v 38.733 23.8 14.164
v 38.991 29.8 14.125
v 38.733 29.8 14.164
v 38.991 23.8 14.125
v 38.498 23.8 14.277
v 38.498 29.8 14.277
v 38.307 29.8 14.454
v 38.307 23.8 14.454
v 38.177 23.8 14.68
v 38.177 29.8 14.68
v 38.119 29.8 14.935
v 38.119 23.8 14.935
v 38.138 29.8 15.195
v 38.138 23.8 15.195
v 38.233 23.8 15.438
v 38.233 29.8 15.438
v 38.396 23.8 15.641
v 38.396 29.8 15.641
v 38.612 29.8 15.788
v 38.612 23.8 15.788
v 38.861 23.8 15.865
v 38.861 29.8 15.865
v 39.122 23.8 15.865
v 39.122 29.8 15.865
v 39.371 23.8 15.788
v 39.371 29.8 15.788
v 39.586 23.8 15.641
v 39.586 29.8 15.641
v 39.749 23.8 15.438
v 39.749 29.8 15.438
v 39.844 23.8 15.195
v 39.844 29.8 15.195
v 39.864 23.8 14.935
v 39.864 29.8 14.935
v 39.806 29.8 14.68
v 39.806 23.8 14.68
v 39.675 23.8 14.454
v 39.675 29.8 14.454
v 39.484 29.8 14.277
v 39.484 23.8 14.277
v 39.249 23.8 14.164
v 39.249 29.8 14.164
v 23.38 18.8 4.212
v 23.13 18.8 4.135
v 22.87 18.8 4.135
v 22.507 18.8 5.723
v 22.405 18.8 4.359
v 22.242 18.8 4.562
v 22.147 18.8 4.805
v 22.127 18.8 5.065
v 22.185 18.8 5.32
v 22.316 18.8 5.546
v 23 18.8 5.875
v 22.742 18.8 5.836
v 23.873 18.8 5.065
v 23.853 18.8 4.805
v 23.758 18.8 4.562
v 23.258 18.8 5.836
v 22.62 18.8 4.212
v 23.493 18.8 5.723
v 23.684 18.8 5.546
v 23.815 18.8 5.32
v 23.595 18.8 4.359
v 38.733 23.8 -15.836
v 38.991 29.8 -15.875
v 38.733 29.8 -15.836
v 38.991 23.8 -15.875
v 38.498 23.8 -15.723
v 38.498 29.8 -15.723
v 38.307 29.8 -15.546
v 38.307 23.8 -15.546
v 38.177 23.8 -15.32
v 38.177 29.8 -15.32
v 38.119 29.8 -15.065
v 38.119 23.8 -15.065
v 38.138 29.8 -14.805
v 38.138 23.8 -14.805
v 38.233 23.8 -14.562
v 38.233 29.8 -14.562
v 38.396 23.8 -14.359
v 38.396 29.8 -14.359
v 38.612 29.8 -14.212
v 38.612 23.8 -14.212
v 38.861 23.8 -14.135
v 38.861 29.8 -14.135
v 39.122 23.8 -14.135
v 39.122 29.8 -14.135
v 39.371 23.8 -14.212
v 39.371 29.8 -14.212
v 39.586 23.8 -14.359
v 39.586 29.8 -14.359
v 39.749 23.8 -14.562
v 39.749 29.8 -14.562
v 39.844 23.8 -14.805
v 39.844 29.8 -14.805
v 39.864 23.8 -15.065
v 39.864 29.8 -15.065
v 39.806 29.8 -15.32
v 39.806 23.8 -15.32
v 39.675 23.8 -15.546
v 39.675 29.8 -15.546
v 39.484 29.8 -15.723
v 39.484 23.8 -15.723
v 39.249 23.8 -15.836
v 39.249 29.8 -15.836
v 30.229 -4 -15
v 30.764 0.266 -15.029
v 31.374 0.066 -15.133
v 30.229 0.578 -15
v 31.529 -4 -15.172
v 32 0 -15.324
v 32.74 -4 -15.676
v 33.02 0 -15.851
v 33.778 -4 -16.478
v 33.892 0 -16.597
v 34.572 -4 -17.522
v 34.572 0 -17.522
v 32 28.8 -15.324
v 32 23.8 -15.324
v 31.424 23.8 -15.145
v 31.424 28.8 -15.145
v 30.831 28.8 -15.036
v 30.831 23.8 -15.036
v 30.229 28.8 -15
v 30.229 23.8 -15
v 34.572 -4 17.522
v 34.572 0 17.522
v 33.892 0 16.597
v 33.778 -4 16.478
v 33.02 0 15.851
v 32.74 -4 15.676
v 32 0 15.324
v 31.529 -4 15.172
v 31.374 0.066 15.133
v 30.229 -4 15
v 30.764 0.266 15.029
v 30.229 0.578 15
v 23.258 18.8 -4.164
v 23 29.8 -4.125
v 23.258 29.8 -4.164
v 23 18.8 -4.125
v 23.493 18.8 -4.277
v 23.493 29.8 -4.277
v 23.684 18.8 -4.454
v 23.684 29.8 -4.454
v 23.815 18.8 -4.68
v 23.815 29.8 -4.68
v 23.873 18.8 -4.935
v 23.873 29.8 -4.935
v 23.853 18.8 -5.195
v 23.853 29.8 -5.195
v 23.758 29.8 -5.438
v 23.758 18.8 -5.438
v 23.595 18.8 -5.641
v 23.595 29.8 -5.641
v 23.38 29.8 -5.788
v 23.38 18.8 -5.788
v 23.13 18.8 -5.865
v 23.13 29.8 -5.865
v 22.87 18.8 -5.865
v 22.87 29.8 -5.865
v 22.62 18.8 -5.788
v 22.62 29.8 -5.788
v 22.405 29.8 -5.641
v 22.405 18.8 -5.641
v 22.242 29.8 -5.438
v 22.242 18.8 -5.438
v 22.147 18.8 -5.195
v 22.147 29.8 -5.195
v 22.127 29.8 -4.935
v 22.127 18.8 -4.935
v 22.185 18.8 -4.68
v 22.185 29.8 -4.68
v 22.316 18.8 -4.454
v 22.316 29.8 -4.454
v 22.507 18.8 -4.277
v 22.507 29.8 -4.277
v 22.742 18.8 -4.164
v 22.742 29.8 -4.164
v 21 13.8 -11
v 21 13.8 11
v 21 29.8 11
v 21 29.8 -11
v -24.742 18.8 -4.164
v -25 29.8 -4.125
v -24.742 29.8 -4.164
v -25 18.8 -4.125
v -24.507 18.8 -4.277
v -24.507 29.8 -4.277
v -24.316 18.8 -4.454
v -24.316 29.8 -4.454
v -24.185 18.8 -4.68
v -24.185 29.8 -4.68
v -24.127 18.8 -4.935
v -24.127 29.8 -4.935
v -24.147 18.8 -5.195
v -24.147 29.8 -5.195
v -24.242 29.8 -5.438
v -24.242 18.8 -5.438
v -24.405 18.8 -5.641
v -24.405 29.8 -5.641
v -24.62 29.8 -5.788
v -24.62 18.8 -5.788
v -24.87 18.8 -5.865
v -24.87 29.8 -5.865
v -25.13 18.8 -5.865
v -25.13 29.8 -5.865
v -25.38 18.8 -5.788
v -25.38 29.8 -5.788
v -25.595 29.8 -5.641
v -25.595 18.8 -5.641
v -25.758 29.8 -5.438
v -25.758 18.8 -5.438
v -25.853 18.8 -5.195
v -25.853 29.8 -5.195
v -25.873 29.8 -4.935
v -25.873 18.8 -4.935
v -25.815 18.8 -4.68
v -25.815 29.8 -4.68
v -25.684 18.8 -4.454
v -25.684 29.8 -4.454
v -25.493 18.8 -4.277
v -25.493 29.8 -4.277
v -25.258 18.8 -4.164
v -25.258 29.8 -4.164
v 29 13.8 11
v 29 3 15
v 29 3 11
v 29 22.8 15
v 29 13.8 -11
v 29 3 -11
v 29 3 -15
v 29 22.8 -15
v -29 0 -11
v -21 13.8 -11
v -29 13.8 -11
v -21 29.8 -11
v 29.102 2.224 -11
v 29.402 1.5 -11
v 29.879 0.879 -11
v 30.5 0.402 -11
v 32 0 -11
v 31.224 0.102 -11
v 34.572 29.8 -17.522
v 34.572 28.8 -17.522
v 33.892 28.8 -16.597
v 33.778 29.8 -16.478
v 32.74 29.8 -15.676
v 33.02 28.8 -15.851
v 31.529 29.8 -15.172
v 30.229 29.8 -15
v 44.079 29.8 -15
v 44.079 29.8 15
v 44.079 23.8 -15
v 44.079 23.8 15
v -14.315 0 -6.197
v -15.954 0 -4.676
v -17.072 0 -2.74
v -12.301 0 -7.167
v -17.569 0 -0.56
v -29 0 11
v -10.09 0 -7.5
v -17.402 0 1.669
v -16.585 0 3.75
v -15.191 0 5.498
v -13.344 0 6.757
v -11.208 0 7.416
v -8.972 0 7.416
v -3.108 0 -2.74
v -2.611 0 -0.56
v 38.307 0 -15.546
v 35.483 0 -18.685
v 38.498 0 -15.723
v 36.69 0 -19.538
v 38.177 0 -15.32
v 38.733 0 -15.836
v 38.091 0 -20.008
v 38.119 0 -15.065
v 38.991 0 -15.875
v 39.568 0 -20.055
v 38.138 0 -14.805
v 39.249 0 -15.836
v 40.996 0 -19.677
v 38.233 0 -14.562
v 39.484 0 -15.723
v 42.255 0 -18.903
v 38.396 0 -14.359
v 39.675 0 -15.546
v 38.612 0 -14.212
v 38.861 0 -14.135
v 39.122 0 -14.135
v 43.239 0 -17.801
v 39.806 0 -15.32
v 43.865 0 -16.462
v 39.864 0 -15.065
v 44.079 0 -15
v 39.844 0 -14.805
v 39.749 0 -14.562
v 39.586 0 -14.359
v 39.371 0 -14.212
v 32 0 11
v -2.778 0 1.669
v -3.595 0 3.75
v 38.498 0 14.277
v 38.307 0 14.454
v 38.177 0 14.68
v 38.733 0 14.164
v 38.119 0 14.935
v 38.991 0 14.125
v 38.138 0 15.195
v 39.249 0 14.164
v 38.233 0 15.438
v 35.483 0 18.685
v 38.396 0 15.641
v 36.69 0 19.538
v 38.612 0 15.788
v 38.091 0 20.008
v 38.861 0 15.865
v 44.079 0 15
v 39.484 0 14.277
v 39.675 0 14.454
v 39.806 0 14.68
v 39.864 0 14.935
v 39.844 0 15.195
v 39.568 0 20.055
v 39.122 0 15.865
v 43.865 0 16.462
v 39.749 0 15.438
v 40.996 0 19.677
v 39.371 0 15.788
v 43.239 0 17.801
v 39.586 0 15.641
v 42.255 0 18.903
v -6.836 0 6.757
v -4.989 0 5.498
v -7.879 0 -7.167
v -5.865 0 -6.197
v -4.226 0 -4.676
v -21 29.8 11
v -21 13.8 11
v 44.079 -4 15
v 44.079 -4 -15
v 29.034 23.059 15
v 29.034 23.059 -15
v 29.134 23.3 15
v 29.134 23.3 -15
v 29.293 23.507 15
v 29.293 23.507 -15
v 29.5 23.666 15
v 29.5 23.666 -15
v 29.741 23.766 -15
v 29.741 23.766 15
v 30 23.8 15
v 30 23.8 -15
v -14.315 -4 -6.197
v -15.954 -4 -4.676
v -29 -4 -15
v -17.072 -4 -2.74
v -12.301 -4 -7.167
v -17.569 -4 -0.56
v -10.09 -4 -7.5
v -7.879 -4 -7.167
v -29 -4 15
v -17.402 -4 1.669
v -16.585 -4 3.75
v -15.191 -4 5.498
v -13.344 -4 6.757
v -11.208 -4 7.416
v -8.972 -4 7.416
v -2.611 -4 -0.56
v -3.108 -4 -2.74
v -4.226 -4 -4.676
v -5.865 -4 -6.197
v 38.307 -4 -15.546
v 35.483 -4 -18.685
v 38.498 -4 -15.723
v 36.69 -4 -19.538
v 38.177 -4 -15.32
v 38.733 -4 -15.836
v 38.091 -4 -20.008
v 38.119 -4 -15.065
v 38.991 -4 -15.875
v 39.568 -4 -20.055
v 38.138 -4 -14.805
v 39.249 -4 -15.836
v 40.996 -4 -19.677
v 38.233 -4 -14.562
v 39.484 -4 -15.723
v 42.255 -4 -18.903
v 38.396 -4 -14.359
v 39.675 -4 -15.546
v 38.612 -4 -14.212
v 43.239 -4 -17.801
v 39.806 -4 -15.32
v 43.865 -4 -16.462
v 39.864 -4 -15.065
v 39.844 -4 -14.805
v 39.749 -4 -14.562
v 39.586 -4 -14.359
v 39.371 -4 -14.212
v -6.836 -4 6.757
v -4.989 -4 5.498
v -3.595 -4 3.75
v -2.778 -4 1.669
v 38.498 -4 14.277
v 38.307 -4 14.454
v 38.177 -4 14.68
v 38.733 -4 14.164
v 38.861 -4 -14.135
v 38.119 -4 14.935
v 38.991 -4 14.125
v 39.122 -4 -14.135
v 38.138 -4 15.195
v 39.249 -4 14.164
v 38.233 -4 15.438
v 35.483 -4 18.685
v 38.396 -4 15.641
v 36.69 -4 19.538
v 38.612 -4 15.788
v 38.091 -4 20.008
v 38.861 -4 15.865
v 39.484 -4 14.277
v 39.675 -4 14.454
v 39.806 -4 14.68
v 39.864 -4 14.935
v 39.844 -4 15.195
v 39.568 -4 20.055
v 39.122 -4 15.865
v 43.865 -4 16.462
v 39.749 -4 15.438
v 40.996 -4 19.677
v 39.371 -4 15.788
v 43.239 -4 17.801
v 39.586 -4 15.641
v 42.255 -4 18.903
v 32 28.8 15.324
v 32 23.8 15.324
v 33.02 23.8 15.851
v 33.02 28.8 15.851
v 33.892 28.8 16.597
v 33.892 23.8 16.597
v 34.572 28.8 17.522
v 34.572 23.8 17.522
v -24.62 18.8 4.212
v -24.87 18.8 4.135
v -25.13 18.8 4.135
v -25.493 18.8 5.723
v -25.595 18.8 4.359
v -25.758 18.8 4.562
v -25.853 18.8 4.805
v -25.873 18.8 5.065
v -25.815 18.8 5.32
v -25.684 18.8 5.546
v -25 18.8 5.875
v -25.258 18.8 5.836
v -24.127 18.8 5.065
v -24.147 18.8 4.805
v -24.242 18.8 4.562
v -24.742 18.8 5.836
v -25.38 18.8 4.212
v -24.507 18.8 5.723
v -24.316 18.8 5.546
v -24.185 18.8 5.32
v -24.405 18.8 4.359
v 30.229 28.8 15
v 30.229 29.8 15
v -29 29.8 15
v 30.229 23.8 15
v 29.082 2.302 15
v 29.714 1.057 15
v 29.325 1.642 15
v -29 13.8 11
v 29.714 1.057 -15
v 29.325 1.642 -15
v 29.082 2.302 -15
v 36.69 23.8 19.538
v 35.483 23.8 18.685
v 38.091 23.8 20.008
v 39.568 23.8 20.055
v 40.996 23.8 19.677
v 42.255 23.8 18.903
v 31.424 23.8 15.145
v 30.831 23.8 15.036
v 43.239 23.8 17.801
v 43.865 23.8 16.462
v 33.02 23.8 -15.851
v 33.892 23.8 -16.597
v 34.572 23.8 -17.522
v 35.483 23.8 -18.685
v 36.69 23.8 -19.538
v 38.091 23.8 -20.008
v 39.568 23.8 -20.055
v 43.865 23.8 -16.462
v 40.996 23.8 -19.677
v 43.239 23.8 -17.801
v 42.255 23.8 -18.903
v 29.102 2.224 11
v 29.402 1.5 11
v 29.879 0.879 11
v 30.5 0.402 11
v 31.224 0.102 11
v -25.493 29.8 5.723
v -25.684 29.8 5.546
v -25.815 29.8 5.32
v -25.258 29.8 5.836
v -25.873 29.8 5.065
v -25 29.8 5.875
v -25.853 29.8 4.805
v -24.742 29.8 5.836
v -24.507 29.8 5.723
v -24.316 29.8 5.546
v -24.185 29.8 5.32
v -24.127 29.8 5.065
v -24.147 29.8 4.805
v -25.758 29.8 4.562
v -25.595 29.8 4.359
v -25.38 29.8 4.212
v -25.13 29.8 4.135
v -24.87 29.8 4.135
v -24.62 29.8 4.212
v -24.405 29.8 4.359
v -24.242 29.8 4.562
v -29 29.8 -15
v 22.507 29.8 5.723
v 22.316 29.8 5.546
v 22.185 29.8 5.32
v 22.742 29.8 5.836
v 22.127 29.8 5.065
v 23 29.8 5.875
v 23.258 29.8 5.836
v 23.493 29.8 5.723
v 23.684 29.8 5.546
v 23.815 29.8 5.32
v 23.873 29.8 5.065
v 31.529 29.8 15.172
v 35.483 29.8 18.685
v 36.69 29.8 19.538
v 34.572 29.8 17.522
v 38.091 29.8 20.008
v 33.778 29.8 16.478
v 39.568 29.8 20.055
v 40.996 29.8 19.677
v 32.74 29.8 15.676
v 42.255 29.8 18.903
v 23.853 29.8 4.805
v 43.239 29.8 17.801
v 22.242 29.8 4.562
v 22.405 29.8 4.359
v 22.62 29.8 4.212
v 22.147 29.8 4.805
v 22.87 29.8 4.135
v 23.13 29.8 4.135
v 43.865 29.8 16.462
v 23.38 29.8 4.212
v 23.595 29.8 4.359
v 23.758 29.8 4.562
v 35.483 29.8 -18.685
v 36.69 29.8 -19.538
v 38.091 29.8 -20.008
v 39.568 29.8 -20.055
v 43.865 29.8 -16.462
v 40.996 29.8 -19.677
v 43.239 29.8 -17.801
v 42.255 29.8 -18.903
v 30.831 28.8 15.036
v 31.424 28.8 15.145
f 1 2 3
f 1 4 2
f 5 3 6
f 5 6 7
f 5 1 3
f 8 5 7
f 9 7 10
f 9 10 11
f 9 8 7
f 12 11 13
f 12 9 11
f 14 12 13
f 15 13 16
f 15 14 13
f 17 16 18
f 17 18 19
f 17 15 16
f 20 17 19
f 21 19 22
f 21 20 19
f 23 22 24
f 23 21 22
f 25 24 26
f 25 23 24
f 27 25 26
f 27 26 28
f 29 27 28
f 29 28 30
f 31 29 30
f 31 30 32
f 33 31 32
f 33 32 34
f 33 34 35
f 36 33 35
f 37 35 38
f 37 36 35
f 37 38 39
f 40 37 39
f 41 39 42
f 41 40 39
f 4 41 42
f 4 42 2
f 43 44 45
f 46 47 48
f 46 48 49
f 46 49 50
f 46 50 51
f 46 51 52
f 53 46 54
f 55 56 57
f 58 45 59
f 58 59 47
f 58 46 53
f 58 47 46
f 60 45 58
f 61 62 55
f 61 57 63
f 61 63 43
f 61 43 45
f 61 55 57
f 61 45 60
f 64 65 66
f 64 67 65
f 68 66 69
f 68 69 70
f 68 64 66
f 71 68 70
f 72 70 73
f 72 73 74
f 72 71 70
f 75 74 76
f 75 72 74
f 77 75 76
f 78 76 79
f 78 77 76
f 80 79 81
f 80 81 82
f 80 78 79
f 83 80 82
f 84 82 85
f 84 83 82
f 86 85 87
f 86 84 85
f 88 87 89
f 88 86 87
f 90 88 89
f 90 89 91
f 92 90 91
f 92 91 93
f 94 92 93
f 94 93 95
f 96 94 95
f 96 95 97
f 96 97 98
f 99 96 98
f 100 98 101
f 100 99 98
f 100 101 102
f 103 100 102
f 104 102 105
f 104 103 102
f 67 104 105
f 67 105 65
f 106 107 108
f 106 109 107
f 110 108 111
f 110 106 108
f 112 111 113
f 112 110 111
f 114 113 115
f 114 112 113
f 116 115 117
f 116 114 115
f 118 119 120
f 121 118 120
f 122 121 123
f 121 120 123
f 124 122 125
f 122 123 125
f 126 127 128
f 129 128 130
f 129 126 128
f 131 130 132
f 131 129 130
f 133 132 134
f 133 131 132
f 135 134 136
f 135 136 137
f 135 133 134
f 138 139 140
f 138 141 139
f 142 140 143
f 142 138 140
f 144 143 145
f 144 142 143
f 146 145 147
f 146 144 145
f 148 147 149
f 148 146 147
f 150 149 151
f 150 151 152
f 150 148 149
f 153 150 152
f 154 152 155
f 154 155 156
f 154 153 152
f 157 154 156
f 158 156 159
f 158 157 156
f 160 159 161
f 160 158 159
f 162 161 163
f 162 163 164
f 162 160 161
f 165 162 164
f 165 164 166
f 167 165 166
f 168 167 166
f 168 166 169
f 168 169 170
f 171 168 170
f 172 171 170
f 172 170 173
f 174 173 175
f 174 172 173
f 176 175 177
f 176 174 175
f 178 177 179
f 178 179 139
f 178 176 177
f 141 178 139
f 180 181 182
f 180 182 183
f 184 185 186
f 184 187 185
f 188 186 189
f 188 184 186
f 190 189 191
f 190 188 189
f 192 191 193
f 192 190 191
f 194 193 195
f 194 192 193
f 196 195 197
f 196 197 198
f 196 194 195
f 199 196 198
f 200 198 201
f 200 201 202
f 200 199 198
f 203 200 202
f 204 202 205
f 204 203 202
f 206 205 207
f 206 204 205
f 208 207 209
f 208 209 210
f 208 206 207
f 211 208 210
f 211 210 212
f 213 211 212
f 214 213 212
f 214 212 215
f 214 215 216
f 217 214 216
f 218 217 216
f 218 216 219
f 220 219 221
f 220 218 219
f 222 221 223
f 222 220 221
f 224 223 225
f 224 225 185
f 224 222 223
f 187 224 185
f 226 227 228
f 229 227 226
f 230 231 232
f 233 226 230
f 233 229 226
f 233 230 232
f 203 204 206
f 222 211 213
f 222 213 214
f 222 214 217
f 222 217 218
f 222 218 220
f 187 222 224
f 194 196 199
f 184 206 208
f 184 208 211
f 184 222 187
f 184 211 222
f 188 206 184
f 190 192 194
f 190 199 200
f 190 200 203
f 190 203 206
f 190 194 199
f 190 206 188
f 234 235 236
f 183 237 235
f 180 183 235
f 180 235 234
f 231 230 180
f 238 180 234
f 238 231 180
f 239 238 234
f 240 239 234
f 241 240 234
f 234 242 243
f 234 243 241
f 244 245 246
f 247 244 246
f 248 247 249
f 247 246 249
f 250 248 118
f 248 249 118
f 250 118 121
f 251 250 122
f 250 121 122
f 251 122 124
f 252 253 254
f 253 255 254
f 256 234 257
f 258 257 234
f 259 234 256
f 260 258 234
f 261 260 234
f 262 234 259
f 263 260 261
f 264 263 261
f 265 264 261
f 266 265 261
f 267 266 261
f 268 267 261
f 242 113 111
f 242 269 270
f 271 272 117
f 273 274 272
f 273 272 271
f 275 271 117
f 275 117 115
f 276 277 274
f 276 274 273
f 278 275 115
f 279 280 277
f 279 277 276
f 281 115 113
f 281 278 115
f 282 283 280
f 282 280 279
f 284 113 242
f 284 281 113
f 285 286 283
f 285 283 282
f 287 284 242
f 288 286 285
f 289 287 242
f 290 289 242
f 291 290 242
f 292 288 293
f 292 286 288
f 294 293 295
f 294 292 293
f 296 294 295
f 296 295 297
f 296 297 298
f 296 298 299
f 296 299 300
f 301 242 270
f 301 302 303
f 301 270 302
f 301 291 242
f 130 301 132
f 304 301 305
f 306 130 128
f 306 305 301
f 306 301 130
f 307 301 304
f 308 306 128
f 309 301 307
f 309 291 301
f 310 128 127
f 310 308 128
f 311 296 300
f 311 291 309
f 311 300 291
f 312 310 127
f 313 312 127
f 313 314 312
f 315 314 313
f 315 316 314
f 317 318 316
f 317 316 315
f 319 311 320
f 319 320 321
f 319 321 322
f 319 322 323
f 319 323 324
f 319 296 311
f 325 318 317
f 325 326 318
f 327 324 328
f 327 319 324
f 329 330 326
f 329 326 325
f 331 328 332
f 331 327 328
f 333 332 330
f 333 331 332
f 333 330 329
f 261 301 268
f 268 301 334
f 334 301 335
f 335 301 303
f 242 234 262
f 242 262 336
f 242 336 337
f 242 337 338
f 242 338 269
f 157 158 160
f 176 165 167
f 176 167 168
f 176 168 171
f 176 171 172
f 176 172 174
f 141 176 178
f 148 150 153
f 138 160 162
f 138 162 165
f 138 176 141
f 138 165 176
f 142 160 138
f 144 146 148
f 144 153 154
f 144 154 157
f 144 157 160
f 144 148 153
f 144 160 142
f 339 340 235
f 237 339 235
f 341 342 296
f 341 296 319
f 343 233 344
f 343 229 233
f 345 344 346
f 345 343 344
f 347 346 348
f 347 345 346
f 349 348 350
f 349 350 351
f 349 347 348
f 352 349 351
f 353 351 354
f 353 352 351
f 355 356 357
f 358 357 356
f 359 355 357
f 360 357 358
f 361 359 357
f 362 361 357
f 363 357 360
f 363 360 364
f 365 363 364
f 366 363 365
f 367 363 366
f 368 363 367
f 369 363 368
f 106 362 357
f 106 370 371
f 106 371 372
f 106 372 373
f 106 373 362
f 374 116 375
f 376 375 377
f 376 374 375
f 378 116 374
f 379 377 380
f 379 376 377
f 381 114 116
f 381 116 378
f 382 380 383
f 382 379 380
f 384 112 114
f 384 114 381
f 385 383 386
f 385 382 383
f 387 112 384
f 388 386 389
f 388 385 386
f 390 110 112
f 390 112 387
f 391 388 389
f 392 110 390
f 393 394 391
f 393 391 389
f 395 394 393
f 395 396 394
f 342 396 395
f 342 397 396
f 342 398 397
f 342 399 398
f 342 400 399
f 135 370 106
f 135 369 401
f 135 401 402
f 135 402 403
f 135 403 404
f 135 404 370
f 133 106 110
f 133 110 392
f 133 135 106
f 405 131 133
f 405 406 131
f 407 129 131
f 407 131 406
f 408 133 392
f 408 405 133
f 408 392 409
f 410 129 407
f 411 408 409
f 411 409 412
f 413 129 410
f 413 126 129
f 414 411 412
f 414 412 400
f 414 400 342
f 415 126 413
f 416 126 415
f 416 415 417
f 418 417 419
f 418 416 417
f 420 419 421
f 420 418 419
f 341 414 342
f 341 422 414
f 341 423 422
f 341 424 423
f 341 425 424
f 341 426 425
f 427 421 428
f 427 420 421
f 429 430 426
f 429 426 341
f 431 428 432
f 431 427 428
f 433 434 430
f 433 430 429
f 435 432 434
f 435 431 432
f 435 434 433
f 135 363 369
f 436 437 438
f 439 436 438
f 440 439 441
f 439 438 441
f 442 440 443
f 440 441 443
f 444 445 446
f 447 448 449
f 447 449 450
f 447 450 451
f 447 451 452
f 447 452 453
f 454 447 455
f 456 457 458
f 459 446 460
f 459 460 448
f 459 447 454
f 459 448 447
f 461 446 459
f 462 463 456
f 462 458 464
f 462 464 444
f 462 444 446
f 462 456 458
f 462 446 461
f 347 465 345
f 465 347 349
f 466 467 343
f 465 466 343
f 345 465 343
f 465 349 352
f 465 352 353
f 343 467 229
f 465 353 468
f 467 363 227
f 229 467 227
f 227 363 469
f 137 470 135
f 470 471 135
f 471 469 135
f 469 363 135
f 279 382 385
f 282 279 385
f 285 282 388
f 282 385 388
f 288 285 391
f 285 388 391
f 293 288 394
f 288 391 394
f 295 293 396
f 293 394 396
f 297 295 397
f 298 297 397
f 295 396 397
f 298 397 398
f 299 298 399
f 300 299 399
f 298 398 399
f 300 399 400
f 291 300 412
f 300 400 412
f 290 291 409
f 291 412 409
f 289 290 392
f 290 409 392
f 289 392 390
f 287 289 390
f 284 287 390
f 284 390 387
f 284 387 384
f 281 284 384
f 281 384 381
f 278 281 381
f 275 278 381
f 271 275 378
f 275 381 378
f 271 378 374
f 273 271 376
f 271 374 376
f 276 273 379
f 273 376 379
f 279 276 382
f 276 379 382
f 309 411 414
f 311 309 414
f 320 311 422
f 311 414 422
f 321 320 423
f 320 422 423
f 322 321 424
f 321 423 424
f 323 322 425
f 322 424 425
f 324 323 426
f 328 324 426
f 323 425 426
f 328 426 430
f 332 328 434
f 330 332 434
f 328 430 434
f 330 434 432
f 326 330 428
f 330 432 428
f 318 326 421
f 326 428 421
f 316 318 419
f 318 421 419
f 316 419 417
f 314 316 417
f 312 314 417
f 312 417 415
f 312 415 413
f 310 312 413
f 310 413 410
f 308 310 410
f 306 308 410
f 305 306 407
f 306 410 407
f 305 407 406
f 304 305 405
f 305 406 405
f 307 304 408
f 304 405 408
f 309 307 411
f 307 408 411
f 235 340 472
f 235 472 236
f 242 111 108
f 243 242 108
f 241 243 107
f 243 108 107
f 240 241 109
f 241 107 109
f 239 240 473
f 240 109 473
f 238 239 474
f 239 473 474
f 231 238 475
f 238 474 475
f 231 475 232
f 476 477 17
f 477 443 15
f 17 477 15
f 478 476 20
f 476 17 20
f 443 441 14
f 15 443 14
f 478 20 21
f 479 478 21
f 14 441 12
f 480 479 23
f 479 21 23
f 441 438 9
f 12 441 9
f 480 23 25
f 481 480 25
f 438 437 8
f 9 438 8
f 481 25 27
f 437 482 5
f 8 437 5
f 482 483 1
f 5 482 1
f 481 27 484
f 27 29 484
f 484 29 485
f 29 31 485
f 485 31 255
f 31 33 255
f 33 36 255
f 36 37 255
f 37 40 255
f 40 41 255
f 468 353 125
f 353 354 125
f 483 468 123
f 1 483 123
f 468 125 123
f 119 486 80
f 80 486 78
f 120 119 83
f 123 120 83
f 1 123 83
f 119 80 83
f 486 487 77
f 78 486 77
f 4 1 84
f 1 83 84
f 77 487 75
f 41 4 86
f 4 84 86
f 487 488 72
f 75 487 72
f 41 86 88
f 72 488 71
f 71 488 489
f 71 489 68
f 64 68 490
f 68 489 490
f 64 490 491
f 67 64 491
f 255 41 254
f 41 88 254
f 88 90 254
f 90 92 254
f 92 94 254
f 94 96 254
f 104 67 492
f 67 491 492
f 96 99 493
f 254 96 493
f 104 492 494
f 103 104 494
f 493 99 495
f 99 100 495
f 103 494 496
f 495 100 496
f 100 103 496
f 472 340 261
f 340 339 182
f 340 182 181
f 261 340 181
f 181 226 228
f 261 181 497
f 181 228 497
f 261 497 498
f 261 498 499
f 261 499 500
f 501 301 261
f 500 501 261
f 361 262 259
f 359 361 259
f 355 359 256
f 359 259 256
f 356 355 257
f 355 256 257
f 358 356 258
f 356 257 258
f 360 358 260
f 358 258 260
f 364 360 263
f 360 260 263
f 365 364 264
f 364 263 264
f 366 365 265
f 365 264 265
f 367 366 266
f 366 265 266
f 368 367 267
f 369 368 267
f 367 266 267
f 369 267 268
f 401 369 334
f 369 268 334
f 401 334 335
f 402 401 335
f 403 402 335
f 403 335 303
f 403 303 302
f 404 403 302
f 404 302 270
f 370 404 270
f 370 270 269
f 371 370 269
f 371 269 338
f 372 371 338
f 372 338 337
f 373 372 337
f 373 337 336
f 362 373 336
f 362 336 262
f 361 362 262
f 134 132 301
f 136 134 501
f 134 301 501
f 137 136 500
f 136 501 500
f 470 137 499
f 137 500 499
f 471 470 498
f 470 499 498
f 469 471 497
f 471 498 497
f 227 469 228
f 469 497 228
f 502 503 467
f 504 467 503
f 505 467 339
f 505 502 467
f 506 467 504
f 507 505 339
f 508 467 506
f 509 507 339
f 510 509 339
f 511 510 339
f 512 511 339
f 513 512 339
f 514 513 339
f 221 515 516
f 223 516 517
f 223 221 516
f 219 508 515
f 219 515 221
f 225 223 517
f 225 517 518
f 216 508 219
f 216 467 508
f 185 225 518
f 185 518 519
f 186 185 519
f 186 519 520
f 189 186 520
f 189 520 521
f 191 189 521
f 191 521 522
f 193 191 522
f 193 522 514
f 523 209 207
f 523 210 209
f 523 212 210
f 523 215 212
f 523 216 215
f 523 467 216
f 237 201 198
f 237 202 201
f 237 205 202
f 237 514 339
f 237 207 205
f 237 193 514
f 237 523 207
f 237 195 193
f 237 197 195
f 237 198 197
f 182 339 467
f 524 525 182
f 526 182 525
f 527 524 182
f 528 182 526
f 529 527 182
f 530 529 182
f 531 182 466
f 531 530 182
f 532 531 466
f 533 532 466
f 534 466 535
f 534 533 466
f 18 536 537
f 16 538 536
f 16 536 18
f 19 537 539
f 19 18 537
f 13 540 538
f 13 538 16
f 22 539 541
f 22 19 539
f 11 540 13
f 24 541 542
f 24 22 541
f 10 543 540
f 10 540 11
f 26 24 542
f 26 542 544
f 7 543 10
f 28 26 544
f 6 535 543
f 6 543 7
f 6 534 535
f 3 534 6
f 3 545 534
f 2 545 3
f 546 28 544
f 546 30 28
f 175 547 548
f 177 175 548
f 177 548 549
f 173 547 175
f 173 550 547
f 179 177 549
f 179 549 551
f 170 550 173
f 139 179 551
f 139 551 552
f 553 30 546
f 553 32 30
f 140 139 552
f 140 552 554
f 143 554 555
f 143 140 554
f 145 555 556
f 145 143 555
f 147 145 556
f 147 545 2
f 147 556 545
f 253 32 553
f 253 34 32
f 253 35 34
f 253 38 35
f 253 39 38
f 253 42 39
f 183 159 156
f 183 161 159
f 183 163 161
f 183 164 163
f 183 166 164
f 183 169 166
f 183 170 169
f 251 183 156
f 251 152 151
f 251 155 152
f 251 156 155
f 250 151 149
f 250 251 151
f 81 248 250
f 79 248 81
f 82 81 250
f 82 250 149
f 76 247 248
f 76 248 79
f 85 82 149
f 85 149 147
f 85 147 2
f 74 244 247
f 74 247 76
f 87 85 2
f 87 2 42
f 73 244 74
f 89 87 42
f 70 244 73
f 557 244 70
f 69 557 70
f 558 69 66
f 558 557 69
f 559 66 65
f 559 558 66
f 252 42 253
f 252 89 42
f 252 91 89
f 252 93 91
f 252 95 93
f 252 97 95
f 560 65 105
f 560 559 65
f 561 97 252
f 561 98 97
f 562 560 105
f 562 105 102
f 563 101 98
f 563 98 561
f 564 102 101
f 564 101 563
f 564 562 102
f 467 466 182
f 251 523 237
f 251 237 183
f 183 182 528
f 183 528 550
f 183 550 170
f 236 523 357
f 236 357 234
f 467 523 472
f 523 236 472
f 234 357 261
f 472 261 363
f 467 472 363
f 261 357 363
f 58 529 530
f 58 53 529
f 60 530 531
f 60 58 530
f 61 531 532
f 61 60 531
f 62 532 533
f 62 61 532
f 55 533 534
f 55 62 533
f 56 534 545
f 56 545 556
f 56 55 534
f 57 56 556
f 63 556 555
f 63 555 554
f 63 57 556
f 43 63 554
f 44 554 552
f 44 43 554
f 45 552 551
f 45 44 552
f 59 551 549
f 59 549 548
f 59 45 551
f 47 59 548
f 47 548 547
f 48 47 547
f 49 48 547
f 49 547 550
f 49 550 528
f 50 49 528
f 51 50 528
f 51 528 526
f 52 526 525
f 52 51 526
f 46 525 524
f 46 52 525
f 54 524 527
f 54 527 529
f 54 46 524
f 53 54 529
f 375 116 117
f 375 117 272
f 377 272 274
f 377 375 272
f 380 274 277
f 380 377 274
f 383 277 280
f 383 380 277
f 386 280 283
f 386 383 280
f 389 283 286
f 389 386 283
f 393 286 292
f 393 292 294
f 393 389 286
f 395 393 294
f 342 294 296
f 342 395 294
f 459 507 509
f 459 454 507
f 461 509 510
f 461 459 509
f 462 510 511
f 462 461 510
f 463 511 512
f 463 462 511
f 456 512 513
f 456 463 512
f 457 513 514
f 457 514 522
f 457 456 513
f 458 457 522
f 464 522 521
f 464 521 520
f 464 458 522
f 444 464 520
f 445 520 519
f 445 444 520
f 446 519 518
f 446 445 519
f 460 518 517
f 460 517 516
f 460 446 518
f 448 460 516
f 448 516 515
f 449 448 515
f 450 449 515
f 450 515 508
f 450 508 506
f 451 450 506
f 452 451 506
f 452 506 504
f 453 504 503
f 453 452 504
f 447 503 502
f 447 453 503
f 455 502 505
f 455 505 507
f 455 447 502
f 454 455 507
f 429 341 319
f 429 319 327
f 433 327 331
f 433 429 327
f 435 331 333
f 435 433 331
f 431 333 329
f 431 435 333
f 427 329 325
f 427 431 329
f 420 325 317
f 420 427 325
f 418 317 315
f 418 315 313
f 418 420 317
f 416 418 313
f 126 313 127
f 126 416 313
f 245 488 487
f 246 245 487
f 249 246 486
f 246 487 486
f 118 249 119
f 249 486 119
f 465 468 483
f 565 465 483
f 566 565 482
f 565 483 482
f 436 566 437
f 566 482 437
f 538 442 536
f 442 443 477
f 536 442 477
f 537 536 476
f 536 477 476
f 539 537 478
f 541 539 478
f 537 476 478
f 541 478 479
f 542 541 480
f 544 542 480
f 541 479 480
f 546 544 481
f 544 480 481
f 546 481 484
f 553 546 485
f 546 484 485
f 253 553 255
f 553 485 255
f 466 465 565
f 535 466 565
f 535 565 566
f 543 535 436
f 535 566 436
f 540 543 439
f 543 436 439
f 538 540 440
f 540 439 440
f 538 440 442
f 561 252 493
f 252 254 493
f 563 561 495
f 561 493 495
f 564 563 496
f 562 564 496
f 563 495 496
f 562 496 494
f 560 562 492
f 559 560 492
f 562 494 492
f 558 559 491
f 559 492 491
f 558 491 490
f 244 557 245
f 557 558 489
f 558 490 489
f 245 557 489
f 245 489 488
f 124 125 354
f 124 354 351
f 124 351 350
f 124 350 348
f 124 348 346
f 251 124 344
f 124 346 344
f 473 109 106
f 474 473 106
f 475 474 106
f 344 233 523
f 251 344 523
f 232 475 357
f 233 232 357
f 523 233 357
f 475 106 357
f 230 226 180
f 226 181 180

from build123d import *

# Parameters (mm, degrees)
SKETCH2_W           = 50
SKETCH2_H           = 30
SKETCH2_W_2         = 42
SKETCH2_H_2         = 22
BOSS_EXTRUDE1_DEPTH = 28.8
SKETCH3_W           = 50
SKETCH3_H           = 30
BOSS_EXTRUDE2_DEPTH = 4
SKETCH4_W           = 22
SKETCH4_H           = 17.8
CUT_EXTRUDE1_DEPTH  = 4
SKETCH5_W           = 30
SKETCH5_H           = 32.8
BOSS_EXTRUDE3_DEPTH = 4
BOSS_EXTRUDE4_DEPTH = 4
SKETCH7_R           = 0.875
CUT_EXTRUDE2_DEPTH  = 10
SKETCH8_R           = 0.875
BOSS_EXTRUDE5_DEPTH = 4
FILLET1_R           = 3
BOSS_EXTRUDE6_START = -5
SKETCH9_R           = 0.875
BOSS_EXTRUDE6_DEPTH = 5
FILLET2_R           = 1
SKETCH11_R          = 0.875
SKETCH11_W          = 42
SKETCH11_H          = 22
BOSS_EXTRUDE7_DEPTH = 1
SKETCH14_R          = 5
CUT_EXTRUDE3_DEPTH  = 37
SKETCH17_R          = 7.5
CUT_EXTRUDE4_DEPTH  = 57.873262079
SKETCH18_R          = 5
BOSS_EXTRUDE9_DEPTH = 4
CUT_EXTRUDE5_DEPTH  = 75.343138703


with BuildPart() as part:
    # Sketch2 → Boss-Extrude1 (new body)
    with BuildSketch(Plane(origin=(0, 0, 0), x_dir=(1, 0, 0), z_dir=(0, 1, 0))):
        Rectangle(SKETCH2_W, SKETCH2_H)
        Rectangle(SKETCH2_W_2, SKETCH2_H_2, mode=Mode.SUBTRACT)
    extrude(amount=BOSS_EXTRUDE1_DEPTH)

    # Sketch3 → Boss-Extrude2 (add)
    with BuildSketch(Plane.XZ):
        Rectangle(SKETCH3_W, SKETCH3_H)
    extrude(amount=BOSS_EXTRUDE2_DEPTH)

    # Sketch4 → Cut-Extrude1 (cut)
    with BuildSketch(Plane(origin=(25, 0, 0), x_dir=(0, 0, -1), z_dir=(1, 0, 0))):
        with Locations((0, 4.9)):
            Rectangle(SKETCH4_W, SKETCH4_H)
    extrude(amount=-CUT_EXTRUDE1_DEPTH, mode=Mode.SUBTRACT)

    # Sketch5 → Boss-Extrude3 (add)
    with BuildSketch(Plane.ZY.offset(25)):
        with Locations((0, 12.4)):
            Rectangle(SKETCH5_W, SKETCH5_H)
    extrude(amount=BOSS_EXTRUDE3_DEPTH)

    # Sketch6 → Boss-Extrude4 (add)
    with BuildSketch(Plane(origin=(25, 0, 0), x_dir=(0, 0, -1), z_dir=(1, 0, 0))):
        Polygon((-15, -4), (-11, -4), (-11, 13.8), (11, 13.8), (11, -4), (15, -4), (15, 28.8), (-15, 28.8), align=None)
    extrude(amount=BOSS_EXTRUDE4_DEPTH)

    # Sketch7 → Cut-Extrude2 (cut)
    with BuildSketch(Plane(origin=(0, 28.8, 0), x_dir=(1, 0, 0), z_dir=(0, 1, 0))):
        with Locations(Location((23, -5, 0), (0, 0, 270))):
            Circle(SKETCH7_R)
        with Locations(Location((23, 5, 0), (0, 0, 270))):
            Circle(SKETCH7_R)
        with Locations(Location((-25, 5, 0), (0, 0, 270))):
            Circle(SKETCH7_R)
        with Locations(Location((-25, -5, 0), (0, 0, 270))):
            Circle(SKETCH7_R)
    extrude(amount=-CUT_EXTRUDE2_DEPTH, mode=Mode.SUBTRACT)

    # Sketch8 → Boss-Extrude5 (add)
    with BuildSketch(Plane.XZ.offset(4)):
        with BuildLine():
            Line((20.903006959, -15), (30.229257675, -15))
            ThreePointArc((30.229257675, -15), (32.740161395, -15.676186578), (34.571929358, -17.521854998))
            ThreePointArc((34.571929358, -17.521854998), (40.295729423, -19.918118011), (44.079388874, -15))
            Line((44.079388874, -15), (44.079388874, 15))
            ThreePointArc((44.079388874, 15), (40.295729423, 19.918118011), (34.571929358, 17.521854998))
            ThreePointArc((34.571929358, 17.521854998), (32.740161395, 15.676186578), (30.229257675, 15))
            Line((30.229257675, 15), (20.903006959, 15))
            Line((20.903006959, 15), (20.903006959, -15))
        make_face()
        with Locations(Location((38.991197916, 15, 0), (0, 0, 270))):
            Circle(SKETCH8_R, mode=Mode.SUBTRACT)
        with Locations(Location((38.991197916, -15, 0), (0, 0, 270))):
            Circle(SKETCH8_R, mode=Mode.SUBTRACT)
    extrude(amount=-BOSS_EXTRUDE5_DEPTH)

    # Fillet1
    fillet1_edges = [part.edges().sort_by_distance(p)[0] for p in [
        (29, 0, -13),
        (29, 0, 13),
    ]]
    fillet(fillet1_edges, radius=FILLET1_R)

    # Sketch9 → Boss-Extrude6 (add)
    with BuildSketch(Plane(origin=(0, 28.8, 0), x_dir=(1, 0, 0), z_dir=(0, 1, 0)).offset(BOSS_EXTRUDE6_START)):
        with BuildLine():
            Line((30.229257675, 15), (26.332891716, 15))
            Line((26.332891716, 15), (26.332891716, -15))
            Line((26.332891716, -15), (30.229257675, -15))
            ThreePointArc((30.229257675, -15), (31.129332579, -15.081680656), (32, -15.324053934))
            ThreePointArc((32, -15.324053934), (33.477494133, -16.198821247), (34.571929358, -17.521854998))
            ThreePointArc((34.571929358, -17.521854998), (40.295729423, -19.918118011), (44.079388874, -15))
            Line((44.079388874, -15), (44.079388874, 15))
            ThreePointArc((44.079388874, 15), (40.295729423, 19.918118011), (34.571929358, 17.521854998))
            ThreePointArc((34.571929358, 17.521854998), (33.477494133, 16.198821247), (32, 15.324053934))
            ThreePointArc((32, 15.324053934), (31.129332579, 15.081680656), (30.229257675, 15))
        make_face()
        with Locations(Location((38.991197916, -15, 0), (0, 0, 90))):
            Circle(SKETCH9_R, mode=Mode.SUBTRACT)
        with Locations(Location((38.991197916, 15, 0), (0, 0, 90))):
            Circle(SKETCH9_R, mode=Mode.SUBTRACT)
    extrude(amount=BOSS_EXTRUDE6_DEPTH)

    # Fillet2
    fillet2_edges = [part.edges().sort_by_distance(p)[0] for p in [
        (29, 23.8, 0),
    ]]
    fillet(fillet2_edges, radius=FILLET2_R)

    # Sketch11 → Boss-Extrude7 (add)
    with BuildSketch(Plane(origin=(0, 28.8, 0), x_dir=(1, 0, 0), z_dir=(0, 1, 0))):
        with BuildLine():
            Line((-29, -15), (30.229257675, -15))
            ThreePointArc((30.229257675, -15), (32.740161395, -15.676186578), (34.571929358, -17.521854998))
            ThreePointArc((34.571929358, -17.521854998), (40.295729423, -19.918118011), (44.079388874, -15))
            Line((44.079388874, -15), (44.079388874, 15))
            ThreePointArc((44.079388874, 15), (40.295729423, 19.918118011), (34.571929358, 17.521854998))
            ThreePointArc((34.571929358, 17.521854998), (32.740161395, 15.676186578), (30.229257675, 15))
            Line((30.229257675, 15), (-29, 15))
            Line((-29, 15), (-29, -15))
        make_face()
        with Locations(Location((-25, 5, 0), (0, 0, 270))):
            Circle(SKETCH11_R, mode=Mode.SUBTRACT)
        with Locations(Location((-25, -5, 0), (0, 0, 270))):
            Circle(SKETCH11_R, mode=Mode.SUBTRACT)
        with Locations(Location((23, 5, 0), (0, 0, 270))):
            Circle(SKETCH11_R, mode=Mode.SUBTRACT)
        with Locations(Location((23, -5, 0), (0, 0, 270))):
            Circle(SKETCH11_R, mode=Mode.SUBTRACT)
        with Locations(Location((38.991197916, -15, 0), (0, 0, 90))):
            Circle(SKETCH11_R, mode=Mode.SUBTRACT)
        with Locations(Location((38.991197916, 15, 0), (0, 0, 90))):
            Circle(SKETCH11_R, mode=Mode.SUBTRACT)
        Rectangle(SKETCH11_W, SKETCH11_H, mode=Mode.SUBTRACT)
    extrude(amount=BOSS_EXTRUDE7_DEPTH)

    # Sketch14 → Cut-Extrude3 (cut)
    with BuildSketch(Plane.XZ.offset(4)):
        with Locations(Location((10.09, 0, 0), (0, 0, 270))):
            Circle(SKETCH14_R)
    extrude(amount=-CUT_EXTRUDE3_DEPTH, mode=Mode.SUBTRACT)

    # Sketch17 → Cut-Extrude4 (cut, through all)
    with BuildSketch(Plane(origin=(0, 0, 0), x_dir=(1, 0, 0), z_dir=(0, 1, 0))):
        with Locations(Location((-10.09, 0, 0), (0, 0, 90))):
            Circle(SKETCH17_R)
    extrude(amount=-CUT_EXTRUDE4_DEPTH, mode=Mode.SUBTRACT)

    # Sketch18 → Boss-Extrude9 (add)
    with BuildSketch(Plane.XZ.offset(4)):
        with Locations((10.09, 0)):
            Circle(SKETCH18_R)
    extrude(amount=-BOSS_EXTRUDE9_DEPTH)

    # Sketch19 → Cut-Extrude5 (cut, through all)
    with BuildSketch(Plane(origin=(-21, 0, 0), x_dir=(0, 0, -1), z_dir=(1, 0, 0))):
        Polygon((-11, 13.8), (11, 13.8), (11, 0), (-11, 0), (-11, 3), align=None)
    extrude(amount=-CUT_EXTRUDE5_DEPTH, mode=Mode.SUBTRACT)


solid = part.part
